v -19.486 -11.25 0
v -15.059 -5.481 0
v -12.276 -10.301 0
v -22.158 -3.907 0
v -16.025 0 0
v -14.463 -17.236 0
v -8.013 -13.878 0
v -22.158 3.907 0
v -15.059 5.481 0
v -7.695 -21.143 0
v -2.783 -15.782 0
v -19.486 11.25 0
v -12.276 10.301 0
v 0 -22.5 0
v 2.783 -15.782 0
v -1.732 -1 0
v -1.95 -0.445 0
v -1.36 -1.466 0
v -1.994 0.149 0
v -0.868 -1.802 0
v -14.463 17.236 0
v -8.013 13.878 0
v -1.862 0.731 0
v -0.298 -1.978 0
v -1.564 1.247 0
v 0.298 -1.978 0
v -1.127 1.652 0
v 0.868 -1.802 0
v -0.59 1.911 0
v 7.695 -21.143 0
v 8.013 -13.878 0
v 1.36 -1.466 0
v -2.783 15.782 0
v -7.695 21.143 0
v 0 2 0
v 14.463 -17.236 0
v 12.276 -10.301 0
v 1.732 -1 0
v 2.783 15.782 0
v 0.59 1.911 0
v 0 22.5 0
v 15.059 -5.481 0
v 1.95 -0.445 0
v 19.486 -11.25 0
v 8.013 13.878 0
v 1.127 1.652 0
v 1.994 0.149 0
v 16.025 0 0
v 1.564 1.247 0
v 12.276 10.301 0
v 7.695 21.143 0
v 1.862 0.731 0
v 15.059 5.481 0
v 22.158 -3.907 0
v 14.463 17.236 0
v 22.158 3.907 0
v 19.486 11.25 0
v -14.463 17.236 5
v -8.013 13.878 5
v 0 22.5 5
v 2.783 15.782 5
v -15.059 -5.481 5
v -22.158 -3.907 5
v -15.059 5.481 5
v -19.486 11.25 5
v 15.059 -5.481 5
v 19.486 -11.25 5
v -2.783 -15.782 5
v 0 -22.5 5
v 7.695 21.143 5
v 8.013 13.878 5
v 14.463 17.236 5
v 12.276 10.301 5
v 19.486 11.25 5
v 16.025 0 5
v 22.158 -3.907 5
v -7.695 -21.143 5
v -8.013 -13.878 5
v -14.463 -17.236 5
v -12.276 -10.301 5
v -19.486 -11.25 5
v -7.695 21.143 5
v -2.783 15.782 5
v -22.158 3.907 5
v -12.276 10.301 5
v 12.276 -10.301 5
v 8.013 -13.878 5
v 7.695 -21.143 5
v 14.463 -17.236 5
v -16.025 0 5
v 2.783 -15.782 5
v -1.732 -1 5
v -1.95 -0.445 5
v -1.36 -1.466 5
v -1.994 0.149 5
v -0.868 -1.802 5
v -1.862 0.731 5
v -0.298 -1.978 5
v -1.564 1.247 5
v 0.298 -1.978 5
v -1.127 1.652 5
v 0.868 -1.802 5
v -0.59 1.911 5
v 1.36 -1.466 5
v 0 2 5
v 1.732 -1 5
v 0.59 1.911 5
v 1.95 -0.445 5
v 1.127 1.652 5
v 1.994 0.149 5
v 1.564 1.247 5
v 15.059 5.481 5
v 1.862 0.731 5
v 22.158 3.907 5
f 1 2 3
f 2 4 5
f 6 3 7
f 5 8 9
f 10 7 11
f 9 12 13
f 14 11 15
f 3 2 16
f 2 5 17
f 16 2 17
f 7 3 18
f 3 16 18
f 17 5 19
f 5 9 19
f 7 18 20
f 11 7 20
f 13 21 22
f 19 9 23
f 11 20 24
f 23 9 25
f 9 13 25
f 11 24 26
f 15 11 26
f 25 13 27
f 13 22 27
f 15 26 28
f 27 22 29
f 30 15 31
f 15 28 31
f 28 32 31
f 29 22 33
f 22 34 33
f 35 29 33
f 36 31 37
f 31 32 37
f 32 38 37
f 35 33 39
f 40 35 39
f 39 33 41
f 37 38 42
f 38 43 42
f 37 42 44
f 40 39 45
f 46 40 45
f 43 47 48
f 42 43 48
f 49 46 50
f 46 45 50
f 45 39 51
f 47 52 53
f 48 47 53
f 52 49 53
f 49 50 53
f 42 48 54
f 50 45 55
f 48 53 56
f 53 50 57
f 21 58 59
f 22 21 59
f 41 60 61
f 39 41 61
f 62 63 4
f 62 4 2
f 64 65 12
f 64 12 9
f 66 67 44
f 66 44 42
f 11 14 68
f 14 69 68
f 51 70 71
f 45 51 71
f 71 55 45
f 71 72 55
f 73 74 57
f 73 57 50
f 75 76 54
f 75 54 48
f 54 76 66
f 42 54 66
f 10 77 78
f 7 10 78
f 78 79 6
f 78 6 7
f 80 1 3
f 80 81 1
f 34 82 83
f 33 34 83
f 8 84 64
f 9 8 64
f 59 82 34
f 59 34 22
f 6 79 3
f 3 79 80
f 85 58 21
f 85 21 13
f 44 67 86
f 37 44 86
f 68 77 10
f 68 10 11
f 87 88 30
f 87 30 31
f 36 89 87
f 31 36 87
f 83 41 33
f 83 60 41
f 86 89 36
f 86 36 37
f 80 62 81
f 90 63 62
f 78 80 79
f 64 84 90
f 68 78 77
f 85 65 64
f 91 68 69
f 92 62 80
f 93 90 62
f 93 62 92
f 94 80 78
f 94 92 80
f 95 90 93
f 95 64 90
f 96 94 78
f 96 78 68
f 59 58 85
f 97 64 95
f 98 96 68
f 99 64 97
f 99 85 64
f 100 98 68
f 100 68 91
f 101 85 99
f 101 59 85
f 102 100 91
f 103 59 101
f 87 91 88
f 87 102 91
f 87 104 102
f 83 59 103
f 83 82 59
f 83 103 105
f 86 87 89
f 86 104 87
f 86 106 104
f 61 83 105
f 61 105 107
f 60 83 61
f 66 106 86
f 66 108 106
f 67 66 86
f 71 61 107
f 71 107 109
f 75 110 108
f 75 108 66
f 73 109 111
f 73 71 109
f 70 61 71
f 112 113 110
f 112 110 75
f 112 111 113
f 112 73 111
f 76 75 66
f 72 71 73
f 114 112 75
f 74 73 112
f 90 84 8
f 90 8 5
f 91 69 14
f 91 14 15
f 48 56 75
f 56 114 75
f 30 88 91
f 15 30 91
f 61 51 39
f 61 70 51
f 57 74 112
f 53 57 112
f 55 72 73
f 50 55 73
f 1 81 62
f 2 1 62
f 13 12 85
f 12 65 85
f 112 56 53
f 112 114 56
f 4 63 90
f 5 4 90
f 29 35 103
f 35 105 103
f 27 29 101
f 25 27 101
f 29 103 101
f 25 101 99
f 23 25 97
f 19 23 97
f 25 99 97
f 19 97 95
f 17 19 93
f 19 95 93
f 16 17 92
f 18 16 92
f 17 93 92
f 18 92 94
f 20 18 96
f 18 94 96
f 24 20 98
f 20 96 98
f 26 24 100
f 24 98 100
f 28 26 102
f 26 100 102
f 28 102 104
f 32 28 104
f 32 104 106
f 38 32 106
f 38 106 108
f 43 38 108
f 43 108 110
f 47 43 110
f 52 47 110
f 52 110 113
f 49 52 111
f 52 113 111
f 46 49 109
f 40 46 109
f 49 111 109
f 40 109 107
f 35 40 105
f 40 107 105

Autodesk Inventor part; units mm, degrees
ref_plane "YZ Plane" through (0, 0, 0) normal (1, 0, 0) x (0, 1, 0)
ref_plane "XZ Plane" through (0, 0, 0) normal (0, 1, 0) x (-1, 0, 0)
ref_plane "XY Plane" through (0, 0, 0) normal (0, 0, 1) x (1, 0, 0)
sketch "Sketch2" plane through (0, 0, 0) normal (0, 0, 1) x (1, 0, 0)
  circle A0 centre (0, 0) radius 12.5
  dimension "d0" = 25
extrude "Extrusion1" add sketch "Sketch2" along normal blind 5
sketch "Sketch3" plane through (0, 0, 5) normal (0, 0, 1) x (1, 0, 0)
  line L0 (0, 0) -> (0, 9.5351)
  line L1 (0, 22.5) -> (-4.4873, 11.6668)
  circle A0 centre (0, 0) radius 12.5 projected
  line L2 (0, 22.5) -> (4.4873, 11.6668)
  arc A1 (4.4873, 11.6668) -> (-4.4873, 11.6668) centre (0, 0) ccw
  point P0 (0, 12.5)
  dimension "d3" = 45
  dimension "d4" = 10
extrude "Extrusion2" add sketch "Sketch3" against normal up to surface (5 mm away) contours L2 A0 L1
pattern_circular "Circular Pattern1" count 18 over 360 about axis through (0, 0, 0) along (0, 0, 1) of "Extrusion2"
sketch "Sketch4" plane through (0, 0, 0) normal (0, 0, -1) x (-1, 0, 0)
  point P0 (0, 0)
  point P1 (0, 0)
hole "Hole1" at (0, 0, 0) at (0, 0, 0) direction (0, 0, 1) diameter 4 end through all
properties part number "Drive Gear"
